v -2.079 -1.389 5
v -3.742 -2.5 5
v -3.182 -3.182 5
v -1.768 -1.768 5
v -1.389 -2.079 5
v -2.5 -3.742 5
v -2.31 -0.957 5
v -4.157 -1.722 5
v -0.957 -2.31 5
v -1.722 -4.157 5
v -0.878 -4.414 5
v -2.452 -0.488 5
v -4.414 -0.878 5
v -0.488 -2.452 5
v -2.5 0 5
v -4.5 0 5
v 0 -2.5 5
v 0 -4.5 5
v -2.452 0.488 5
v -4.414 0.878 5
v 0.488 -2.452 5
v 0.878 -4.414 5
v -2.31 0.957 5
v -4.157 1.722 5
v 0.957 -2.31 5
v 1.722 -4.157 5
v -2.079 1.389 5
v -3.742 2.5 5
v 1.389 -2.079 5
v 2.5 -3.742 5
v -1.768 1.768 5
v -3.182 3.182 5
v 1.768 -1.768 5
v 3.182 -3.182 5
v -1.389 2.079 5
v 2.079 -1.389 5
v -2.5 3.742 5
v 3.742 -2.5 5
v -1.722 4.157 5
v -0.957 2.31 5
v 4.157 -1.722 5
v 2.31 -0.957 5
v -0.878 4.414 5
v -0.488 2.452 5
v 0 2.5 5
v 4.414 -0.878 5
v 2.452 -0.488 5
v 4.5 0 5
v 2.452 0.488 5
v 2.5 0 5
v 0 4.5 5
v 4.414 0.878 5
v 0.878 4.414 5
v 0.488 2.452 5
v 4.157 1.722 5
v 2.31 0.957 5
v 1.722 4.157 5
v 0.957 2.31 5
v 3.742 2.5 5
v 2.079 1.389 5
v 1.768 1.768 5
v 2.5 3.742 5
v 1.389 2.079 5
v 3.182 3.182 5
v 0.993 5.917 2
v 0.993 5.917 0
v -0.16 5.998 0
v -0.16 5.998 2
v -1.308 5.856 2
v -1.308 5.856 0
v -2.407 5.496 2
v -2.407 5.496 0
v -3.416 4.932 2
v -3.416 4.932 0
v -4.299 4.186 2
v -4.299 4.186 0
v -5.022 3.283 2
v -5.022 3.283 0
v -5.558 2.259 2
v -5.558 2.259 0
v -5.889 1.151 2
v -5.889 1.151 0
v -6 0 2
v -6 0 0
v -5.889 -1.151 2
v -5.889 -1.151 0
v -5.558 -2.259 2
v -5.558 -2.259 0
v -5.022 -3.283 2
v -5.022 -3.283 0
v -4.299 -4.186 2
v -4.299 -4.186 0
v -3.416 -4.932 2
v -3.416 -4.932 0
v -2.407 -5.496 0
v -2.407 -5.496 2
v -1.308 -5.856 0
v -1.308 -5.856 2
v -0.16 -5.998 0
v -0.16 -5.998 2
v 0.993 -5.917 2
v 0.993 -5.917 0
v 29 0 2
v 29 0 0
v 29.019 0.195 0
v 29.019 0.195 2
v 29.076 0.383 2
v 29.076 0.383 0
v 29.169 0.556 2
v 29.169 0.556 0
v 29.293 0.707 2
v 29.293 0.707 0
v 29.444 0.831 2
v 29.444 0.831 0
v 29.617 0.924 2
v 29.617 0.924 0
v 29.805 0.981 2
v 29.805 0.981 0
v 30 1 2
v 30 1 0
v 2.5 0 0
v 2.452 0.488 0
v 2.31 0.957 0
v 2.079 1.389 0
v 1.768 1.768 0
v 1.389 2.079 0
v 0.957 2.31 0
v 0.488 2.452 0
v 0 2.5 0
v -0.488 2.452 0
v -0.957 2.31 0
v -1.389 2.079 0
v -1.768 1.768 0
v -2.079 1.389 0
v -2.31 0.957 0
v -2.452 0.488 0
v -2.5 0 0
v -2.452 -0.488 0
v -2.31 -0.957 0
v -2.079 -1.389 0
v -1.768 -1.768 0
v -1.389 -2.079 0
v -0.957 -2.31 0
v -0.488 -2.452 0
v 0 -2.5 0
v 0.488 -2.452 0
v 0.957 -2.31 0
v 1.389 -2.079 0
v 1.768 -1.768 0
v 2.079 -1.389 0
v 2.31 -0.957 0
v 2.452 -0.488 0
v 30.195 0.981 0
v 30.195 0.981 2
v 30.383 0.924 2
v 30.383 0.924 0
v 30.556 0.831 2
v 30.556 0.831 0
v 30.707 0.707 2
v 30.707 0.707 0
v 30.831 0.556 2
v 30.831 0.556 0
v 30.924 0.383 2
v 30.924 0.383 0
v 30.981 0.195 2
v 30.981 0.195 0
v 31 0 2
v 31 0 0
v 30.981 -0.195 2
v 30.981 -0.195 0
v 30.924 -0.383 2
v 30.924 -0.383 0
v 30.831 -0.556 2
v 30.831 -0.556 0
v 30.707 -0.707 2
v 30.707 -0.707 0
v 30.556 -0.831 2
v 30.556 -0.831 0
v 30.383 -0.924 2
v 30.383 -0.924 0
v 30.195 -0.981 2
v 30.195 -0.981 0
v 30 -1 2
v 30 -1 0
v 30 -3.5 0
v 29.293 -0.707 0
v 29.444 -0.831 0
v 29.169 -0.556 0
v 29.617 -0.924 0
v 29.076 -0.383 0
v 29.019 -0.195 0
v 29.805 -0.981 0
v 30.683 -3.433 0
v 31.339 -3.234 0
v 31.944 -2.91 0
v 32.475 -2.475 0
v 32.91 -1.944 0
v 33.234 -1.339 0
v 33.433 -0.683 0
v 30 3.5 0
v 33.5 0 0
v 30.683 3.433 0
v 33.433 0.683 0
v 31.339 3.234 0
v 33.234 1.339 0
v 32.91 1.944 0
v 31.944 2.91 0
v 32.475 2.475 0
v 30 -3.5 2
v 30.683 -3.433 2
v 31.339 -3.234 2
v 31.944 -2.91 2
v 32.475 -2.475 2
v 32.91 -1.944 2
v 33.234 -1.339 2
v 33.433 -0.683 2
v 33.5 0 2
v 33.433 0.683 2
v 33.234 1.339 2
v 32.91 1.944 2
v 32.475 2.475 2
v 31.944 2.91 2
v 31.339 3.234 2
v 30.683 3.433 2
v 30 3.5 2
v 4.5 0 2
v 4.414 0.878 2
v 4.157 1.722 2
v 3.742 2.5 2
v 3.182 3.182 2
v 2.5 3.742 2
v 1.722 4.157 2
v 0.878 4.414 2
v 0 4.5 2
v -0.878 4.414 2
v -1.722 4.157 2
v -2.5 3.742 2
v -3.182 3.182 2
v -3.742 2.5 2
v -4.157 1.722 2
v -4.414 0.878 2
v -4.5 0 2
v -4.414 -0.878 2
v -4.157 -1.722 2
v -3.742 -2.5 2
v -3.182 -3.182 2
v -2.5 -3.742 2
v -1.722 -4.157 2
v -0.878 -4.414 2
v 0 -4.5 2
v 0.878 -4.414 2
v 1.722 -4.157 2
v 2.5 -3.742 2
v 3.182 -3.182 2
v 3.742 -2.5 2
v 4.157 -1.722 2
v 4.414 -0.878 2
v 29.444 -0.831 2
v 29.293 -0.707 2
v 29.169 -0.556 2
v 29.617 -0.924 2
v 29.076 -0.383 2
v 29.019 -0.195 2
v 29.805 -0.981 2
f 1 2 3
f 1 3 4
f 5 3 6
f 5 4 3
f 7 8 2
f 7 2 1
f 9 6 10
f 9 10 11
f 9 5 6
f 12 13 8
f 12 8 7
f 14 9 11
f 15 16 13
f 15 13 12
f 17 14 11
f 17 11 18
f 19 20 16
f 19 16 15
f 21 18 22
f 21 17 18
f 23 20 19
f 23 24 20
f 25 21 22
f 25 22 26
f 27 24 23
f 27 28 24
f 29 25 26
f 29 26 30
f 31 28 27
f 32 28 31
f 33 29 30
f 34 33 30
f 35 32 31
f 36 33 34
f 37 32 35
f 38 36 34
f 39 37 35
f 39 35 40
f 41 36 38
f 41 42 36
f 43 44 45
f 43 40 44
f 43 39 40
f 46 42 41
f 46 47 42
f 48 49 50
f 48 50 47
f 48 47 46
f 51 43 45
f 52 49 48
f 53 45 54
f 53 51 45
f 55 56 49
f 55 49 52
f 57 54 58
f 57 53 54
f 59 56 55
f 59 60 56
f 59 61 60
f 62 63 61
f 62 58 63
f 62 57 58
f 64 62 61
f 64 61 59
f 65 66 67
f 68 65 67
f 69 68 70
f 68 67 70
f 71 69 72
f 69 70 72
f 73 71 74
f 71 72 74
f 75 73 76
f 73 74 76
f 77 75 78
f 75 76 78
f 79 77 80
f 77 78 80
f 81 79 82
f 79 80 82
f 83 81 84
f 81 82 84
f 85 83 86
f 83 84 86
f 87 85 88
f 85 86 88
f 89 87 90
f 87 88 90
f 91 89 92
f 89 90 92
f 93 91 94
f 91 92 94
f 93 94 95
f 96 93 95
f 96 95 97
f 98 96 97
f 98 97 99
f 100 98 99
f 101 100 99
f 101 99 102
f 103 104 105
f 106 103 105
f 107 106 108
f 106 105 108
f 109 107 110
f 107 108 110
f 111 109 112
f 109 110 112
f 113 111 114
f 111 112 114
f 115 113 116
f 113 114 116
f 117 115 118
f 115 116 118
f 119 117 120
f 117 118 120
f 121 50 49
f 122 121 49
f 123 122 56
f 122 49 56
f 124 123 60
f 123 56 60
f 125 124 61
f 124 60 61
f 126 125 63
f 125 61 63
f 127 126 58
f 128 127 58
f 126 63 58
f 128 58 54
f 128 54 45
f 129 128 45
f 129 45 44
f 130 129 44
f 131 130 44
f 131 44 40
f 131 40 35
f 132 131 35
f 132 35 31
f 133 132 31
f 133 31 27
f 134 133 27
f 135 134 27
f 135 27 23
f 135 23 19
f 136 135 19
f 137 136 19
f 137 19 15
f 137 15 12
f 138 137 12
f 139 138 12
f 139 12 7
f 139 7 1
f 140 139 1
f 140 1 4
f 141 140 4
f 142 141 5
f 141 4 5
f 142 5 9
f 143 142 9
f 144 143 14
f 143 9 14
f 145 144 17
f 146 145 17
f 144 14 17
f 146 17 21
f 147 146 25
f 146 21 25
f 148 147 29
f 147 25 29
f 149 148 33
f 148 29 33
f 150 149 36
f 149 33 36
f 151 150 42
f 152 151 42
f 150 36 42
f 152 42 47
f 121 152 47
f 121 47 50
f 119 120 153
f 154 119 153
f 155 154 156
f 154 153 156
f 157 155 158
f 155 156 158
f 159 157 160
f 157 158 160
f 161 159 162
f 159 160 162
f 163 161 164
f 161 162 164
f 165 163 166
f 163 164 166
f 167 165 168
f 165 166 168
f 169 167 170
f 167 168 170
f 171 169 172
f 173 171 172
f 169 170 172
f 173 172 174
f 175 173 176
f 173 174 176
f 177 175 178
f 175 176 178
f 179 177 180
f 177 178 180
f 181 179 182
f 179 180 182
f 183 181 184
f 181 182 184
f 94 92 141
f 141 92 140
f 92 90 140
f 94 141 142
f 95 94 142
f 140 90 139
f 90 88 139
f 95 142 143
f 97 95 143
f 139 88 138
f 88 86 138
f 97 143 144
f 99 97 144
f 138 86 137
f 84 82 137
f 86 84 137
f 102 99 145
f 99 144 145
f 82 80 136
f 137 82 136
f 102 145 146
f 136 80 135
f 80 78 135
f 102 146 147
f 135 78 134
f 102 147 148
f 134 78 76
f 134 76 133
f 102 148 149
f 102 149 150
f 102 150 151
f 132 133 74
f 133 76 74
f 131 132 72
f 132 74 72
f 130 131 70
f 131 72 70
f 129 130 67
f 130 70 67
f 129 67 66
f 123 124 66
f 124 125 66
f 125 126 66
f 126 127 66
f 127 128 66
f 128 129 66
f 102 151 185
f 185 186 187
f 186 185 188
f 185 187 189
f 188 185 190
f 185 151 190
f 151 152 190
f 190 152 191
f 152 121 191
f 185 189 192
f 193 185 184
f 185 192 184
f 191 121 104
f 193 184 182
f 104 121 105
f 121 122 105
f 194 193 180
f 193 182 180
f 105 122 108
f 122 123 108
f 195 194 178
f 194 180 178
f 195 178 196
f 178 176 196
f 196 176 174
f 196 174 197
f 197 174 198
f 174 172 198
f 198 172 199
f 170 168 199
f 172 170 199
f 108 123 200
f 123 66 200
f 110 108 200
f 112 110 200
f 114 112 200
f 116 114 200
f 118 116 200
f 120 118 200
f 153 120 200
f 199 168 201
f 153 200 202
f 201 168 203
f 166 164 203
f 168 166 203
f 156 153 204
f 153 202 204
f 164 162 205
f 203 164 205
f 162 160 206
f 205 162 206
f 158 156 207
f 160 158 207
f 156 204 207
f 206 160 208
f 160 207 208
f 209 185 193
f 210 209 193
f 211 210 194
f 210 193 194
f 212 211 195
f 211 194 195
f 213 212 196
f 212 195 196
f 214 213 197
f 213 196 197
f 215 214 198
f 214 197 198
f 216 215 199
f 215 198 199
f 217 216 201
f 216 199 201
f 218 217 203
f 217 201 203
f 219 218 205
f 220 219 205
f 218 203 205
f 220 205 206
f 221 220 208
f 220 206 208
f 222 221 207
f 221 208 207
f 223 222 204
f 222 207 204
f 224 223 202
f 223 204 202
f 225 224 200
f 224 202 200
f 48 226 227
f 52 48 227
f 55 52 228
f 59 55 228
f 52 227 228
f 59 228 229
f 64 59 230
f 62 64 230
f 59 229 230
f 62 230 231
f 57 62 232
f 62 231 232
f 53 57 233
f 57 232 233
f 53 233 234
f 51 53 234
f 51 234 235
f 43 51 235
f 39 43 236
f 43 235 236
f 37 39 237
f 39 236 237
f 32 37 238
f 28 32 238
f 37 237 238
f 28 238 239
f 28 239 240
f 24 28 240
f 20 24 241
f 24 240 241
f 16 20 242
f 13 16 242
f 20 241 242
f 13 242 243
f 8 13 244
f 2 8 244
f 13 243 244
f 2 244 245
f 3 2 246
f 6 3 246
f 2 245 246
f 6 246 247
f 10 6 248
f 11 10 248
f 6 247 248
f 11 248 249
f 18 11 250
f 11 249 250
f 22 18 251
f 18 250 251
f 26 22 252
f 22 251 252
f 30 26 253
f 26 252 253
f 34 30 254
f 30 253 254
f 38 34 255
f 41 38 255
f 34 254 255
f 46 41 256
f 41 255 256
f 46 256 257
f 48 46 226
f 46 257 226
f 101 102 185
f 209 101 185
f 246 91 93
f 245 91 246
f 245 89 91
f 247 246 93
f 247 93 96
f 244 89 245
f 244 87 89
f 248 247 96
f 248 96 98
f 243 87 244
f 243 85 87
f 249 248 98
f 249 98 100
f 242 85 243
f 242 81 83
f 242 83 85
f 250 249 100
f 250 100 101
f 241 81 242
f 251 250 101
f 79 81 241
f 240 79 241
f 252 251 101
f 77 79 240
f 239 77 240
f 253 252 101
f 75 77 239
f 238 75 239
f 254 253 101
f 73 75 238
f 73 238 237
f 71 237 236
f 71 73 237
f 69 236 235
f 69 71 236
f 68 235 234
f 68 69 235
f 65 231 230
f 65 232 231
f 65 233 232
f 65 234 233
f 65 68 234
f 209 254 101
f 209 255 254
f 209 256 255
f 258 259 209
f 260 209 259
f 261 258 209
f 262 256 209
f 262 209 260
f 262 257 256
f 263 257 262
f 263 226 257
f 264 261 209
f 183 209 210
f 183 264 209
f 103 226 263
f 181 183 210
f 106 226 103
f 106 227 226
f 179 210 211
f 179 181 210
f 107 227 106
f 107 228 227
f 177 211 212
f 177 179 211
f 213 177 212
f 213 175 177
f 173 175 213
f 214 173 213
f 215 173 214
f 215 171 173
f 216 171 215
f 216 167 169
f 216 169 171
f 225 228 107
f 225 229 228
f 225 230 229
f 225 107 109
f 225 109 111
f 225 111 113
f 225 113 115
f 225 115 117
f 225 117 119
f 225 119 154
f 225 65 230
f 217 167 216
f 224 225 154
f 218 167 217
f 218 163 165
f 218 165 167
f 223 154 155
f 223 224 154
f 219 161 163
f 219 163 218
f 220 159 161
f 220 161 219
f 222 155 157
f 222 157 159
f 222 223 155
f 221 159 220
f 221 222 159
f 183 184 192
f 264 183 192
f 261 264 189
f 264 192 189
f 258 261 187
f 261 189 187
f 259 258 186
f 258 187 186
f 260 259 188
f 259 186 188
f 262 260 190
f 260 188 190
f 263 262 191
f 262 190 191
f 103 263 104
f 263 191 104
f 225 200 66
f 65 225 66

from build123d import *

# Parameters (mm, degrees)
SKETCH1_R           = 6
SKETCH1_R_2         = 3.5
BOSS_EXTRUDE1_DEPTH = 2
SKETCH2_R           = 4.5
BOSS_EXTRUDE2_DEPTH = 3
SKETCH3_R           = 2.5
CUT_EXTRUDE1_DEPTH  = 35.398401126
CUT_EXTRUDE2_DEPTH  = 35.398401126


with BuildPart() as part:
    # Sketch1 → Boss-Extrude1 (new body)
    with BuildSketch(Plane.XY):
        Circle(SKETCH1_R)
        with Locations((30, 0)):
            Circle(SKETCH1_R_2)
        Polygon((30, 3.5), (0, 6), (0, -6), (30, -3.5), align=None)
    extrude(amount=BOSS_EXTRUDE1_DEPTH)

    # Sketch2 → Boss-Extrude2 (add)
    with BuildSketch(Plane.XY.offset(2)):
        Circle(SKETCH2_R)
    extrude(amount=BOSS_EXTRUDE2_DEPTH)

    # Sketch3 → Cut-Extrude1 (cut, through all)
    with BuildSketch(Plane.XY.offset(5)):
        Circle(SKETCH3_R)
    extrude(amount=-CUT_EXTRUDE1_DEPTH, mode=Mode.SUBTRACT)

    # Sketch4 → Cut-Extrude2 (cut, through all)
    with BuildSketch(Plane(origin=(0, 0, 0), x_dir=(-1, 0, 0), z_dir=(0, 0, -1))):
        with BuildLine():
            ThreePointArc((-29, 0), (-29.292893219, 0.707106781), (-30, 1))
            Line((-30, 1), (-30, -1))
            ThreePointArc((-30, -1), (-29.292893219, -0.707106781), (-29, 0))
        make_face()
        with BuildLine():
            Line((-30, -1), (-30, 1))
            ThreePointArc((-30, 1), (-31, 0), (-30, -1))
        make_face()
    extrude(amount=-CUT_EXTRUDE2_DEPTH, mode=Mode.SUBTRACT)


solid = part.part
